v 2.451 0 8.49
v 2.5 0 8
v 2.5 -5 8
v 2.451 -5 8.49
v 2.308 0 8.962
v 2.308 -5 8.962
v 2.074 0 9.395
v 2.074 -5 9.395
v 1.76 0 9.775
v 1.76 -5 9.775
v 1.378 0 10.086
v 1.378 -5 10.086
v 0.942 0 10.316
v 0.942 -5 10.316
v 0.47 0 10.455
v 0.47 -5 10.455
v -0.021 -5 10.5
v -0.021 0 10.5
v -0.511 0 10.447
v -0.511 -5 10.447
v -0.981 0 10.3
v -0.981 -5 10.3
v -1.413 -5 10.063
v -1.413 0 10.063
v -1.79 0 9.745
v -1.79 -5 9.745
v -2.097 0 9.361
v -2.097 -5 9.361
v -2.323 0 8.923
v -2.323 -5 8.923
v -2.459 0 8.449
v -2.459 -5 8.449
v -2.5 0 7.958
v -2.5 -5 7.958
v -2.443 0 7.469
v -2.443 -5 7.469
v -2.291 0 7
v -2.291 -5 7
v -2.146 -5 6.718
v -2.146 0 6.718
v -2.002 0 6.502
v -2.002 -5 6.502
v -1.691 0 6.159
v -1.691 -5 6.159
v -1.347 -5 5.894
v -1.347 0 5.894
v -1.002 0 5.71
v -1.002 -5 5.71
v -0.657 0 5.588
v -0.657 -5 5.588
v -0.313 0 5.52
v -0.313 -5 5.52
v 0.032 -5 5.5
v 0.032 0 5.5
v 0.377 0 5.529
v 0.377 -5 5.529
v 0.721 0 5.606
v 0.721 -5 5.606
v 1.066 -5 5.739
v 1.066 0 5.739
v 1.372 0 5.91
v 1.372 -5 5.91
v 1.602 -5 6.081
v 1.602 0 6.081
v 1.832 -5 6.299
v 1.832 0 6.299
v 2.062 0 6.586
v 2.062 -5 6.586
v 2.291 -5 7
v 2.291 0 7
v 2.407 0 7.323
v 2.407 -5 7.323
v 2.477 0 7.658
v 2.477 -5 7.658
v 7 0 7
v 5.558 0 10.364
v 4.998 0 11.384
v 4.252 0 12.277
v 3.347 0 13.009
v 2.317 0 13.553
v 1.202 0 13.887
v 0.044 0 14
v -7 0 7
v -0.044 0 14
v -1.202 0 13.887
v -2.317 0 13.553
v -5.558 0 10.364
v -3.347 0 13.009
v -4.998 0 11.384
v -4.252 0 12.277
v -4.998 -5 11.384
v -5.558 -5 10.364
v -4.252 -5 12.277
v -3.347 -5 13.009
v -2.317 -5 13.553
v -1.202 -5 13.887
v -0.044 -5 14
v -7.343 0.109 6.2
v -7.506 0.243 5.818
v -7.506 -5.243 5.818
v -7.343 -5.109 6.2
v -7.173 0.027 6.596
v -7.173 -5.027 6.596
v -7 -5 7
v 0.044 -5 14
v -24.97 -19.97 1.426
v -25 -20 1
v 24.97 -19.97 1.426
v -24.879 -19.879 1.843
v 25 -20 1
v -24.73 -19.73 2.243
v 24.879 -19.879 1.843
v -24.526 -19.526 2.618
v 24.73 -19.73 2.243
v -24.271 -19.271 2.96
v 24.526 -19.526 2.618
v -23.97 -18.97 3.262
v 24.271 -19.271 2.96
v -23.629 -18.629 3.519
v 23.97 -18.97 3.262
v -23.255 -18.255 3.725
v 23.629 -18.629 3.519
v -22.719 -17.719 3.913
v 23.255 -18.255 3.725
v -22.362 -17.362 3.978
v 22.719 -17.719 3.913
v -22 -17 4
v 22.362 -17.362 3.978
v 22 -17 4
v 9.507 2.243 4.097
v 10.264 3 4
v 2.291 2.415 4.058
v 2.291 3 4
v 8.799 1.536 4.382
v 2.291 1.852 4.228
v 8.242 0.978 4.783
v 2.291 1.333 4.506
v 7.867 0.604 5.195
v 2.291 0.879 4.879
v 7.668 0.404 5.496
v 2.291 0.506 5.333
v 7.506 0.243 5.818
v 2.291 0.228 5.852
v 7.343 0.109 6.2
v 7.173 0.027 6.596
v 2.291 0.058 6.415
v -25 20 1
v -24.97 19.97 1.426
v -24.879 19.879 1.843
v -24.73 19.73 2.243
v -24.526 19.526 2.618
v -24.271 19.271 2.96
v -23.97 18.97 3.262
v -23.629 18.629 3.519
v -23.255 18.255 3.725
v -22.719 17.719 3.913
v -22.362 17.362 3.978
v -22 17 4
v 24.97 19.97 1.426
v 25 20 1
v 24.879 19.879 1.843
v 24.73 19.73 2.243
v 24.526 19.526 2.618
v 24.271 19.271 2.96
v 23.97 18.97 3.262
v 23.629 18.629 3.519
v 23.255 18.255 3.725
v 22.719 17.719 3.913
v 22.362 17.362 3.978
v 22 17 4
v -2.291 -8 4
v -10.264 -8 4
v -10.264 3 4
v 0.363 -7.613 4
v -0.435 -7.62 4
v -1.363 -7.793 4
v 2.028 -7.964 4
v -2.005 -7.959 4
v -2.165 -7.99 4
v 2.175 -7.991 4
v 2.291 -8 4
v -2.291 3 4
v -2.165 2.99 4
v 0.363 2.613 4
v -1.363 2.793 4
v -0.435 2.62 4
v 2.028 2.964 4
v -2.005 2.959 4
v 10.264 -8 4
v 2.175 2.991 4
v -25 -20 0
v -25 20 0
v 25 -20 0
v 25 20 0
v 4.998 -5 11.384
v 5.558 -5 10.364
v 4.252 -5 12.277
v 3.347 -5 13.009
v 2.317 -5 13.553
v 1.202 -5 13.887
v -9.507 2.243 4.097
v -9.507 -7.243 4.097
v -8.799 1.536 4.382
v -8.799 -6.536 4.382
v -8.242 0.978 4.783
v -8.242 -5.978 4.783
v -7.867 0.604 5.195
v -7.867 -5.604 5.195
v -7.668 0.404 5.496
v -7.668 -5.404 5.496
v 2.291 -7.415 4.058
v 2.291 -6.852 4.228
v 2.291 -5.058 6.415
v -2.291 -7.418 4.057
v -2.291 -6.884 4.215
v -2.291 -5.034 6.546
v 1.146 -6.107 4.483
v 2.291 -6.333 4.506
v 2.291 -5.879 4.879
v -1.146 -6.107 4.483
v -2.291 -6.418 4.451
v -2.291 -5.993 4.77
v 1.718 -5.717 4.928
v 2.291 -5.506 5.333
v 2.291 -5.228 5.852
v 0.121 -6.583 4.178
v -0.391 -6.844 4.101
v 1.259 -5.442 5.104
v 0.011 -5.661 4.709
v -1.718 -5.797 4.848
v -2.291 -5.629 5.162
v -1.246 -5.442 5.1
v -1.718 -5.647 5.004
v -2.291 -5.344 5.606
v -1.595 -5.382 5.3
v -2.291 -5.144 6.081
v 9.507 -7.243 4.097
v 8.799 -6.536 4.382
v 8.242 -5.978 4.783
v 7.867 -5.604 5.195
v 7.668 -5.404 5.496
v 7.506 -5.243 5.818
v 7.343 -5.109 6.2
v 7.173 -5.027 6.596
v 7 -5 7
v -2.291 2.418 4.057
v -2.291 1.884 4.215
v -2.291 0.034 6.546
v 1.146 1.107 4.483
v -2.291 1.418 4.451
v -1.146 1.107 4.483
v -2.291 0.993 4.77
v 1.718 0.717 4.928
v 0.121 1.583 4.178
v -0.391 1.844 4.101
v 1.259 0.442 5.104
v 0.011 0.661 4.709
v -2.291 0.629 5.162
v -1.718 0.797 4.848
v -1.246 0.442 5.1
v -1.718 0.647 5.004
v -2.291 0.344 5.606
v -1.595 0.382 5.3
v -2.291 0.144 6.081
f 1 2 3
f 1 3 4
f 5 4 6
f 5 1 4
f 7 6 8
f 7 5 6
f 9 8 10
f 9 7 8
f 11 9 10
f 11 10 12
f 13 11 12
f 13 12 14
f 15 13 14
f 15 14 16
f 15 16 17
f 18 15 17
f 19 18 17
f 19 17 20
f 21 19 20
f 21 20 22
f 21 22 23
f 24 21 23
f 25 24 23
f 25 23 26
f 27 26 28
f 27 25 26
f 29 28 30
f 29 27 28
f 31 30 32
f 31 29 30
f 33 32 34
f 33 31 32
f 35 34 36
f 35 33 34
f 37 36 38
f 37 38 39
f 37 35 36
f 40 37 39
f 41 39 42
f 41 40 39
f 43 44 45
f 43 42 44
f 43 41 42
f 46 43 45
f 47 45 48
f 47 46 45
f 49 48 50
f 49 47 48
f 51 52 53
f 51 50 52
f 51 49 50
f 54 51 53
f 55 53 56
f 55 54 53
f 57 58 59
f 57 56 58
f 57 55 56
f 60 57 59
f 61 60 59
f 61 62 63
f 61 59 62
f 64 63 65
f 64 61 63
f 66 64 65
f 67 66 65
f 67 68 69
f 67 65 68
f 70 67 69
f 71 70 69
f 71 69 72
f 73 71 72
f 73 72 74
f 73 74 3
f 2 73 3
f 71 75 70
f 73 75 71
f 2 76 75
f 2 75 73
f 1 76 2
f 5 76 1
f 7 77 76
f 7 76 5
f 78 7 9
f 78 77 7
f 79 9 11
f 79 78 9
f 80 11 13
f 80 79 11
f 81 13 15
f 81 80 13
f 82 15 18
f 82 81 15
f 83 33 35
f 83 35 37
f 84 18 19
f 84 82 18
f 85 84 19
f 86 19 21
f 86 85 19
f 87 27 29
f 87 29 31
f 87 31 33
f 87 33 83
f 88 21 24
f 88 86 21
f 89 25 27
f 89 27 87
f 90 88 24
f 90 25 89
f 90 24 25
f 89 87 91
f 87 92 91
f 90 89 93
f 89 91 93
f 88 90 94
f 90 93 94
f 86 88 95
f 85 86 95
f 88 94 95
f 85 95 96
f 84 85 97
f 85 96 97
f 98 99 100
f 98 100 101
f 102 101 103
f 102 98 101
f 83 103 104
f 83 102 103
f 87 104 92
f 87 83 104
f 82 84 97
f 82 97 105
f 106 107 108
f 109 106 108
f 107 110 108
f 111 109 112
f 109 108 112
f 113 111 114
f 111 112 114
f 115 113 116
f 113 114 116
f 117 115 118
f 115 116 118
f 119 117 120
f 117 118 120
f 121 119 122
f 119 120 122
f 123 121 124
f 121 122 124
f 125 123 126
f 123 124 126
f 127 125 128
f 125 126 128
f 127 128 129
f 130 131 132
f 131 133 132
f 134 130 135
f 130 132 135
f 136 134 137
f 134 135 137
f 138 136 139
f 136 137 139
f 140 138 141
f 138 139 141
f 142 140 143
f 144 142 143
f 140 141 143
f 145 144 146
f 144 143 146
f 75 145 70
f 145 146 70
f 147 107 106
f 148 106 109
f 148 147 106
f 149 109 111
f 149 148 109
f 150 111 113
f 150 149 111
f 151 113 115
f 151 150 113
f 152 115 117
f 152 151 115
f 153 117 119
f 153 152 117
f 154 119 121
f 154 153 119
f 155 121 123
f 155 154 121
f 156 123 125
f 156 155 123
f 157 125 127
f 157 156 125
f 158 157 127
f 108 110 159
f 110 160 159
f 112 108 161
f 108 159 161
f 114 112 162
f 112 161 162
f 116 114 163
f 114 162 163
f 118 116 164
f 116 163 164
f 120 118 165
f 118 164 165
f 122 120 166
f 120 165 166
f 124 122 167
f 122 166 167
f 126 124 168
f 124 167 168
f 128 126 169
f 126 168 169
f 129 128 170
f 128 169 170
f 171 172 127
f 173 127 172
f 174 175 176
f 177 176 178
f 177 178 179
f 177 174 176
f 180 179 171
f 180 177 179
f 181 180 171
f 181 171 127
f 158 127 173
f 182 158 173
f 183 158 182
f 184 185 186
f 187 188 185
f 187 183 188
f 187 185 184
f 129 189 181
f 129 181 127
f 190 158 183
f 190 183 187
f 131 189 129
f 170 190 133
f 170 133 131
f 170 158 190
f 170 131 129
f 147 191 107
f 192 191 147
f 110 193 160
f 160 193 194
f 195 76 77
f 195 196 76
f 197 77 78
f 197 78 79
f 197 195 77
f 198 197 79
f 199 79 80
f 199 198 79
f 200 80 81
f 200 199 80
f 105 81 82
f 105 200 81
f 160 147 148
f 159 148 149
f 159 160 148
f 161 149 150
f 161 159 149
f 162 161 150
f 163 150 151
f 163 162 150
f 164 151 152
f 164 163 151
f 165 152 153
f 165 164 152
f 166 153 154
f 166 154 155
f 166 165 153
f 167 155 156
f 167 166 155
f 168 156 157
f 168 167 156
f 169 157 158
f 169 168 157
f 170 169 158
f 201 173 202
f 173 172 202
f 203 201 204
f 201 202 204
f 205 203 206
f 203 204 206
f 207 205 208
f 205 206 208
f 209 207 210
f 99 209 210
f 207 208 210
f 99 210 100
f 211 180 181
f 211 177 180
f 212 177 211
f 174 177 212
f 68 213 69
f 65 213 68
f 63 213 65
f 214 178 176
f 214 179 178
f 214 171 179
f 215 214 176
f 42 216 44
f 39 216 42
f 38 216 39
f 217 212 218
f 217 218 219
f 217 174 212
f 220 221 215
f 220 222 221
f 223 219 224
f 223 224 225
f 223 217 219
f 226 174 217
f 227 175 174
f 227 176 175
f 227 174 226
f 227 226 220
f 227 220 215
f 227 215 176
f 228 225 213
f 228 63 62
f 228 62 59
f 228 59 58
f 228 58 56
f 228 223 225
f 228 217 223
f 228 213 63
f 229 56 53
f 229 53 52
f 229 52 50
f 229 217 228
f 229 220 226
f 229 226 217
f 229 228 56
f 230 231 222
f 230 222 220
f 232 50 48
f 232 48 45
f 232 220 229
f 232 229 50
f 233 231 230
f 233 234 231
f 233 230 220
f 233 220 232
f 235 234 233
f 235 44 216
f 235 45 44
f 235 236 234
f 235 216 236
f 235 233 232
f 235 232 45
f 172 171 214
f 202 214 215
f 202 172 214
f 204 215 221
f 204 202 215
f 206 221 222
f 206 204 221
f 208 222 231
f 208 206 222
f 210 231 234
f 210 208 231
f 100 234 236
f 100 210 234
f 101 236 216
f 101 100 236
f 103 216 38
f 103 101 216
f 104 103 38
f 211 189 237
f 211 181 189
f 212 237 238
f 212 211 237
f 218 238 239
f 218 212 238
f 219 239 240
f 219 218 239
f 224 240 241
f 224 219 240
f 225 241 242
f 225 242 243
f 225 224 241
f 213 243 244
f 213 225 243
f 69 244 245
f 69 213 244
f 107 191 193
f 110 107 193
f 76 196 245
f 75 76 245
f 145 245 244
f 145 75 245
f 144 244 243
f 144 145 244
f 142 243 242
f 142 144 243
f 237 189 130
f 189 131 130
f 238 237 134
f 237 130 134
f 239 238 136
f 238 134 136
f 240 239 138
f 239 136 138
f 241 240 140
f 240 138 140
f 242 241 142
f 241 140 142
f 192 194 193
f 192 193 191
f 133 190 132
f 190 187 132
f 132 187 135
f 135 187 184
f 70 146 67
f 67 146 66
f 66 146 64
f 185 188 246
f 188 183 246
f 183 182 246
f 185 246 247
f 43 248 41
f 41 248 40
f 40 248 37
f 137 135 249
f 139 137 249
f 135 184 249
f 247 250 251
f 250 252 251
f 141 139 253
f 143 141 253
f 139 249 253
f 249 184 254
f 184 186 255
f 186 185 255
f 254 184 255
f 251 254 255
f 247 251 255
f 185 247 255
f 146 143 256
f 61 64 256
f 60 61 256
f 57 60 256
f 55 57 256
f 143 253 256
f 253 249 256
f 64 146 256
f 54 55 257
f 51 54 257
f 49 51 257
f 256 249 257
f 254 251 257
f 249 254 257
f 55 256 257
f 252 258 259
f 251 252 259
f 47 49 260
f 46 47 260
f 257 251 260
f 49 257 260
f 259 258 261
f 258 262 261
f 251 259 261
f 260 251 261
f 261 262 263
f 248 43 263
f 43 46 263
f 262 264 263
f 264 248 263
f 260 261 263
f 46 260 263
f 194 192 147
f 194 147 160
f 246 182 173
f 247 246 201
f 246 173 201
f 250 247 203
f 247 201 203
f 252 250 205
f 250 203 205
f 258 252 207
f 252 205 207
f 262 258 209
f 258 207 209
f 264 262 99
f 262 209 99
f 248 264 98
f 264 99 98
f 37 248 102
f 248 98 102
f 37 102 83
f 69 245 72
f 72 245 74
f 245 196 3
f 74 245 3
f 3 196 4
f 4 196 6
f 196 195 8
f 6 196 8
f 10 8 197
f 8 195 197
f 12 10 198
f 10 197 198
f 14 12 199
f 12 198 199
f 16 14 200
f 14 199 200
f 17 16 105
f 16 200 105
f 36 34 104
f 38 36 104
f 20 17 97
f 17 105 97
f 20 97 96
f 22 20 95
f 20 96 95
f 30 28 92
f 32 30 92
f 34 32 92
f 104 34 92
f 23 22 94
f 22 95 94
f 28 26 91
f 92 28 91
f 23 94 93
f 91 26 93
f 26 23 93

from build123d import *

# Parameters (mm, degrees)
SKETCH_W     = 50
SKETCH_H     = 40
PAD_DEPTH    = 4
SKETCH001_R  = 2.5
PAD001_DEPTH = 5
FILLET_R     = 3
FILLET001_R  = 6


with BuildPart() as part:
    # Sketch → Pad (new body)
    with BuildSketch(Plane.XY):
        Rectangle(SKETCH_W, SKETCH_H)
    extrude(amount=PAD_DEPTH)

    # Sketch001 → Pad001 (join)
    with BuildSketch(Plane.XZ):
        Polygon((-10, 0), (-4, 14), (4, 14), (10, 0), align=None)
        with Locations((0, 8)):
            Circle(SKETCH001_R, mode=Mode.SUBTRACT)
    extrude(amount=PAD001_DEPTH)

    # Fillet
    fillet_edges = [part.edges().sort_by_distance(p)[0] for p in [
        (-25, 0, 4),
        (0, 20, 4),
        (0, -20, 4),
        (25, 0, 4),
        (-8.285714, -2.5, 4),
        (0, -5, 4),
        (8.285714, -2.5, 4),
        (0, 0, 4),
    ]]
    fillet(fillet_edges, radius=FILLET_R)

    # Fillet001
    fillet001_edges = [part.edges().sort_by_distance(p)[0] for p in [
        (-4, -2.5, 14),
        (4, -2.5, 14),
    ]]
    fillet(fillet001_edges, radius=FILLET001_R)


solid = part.part
